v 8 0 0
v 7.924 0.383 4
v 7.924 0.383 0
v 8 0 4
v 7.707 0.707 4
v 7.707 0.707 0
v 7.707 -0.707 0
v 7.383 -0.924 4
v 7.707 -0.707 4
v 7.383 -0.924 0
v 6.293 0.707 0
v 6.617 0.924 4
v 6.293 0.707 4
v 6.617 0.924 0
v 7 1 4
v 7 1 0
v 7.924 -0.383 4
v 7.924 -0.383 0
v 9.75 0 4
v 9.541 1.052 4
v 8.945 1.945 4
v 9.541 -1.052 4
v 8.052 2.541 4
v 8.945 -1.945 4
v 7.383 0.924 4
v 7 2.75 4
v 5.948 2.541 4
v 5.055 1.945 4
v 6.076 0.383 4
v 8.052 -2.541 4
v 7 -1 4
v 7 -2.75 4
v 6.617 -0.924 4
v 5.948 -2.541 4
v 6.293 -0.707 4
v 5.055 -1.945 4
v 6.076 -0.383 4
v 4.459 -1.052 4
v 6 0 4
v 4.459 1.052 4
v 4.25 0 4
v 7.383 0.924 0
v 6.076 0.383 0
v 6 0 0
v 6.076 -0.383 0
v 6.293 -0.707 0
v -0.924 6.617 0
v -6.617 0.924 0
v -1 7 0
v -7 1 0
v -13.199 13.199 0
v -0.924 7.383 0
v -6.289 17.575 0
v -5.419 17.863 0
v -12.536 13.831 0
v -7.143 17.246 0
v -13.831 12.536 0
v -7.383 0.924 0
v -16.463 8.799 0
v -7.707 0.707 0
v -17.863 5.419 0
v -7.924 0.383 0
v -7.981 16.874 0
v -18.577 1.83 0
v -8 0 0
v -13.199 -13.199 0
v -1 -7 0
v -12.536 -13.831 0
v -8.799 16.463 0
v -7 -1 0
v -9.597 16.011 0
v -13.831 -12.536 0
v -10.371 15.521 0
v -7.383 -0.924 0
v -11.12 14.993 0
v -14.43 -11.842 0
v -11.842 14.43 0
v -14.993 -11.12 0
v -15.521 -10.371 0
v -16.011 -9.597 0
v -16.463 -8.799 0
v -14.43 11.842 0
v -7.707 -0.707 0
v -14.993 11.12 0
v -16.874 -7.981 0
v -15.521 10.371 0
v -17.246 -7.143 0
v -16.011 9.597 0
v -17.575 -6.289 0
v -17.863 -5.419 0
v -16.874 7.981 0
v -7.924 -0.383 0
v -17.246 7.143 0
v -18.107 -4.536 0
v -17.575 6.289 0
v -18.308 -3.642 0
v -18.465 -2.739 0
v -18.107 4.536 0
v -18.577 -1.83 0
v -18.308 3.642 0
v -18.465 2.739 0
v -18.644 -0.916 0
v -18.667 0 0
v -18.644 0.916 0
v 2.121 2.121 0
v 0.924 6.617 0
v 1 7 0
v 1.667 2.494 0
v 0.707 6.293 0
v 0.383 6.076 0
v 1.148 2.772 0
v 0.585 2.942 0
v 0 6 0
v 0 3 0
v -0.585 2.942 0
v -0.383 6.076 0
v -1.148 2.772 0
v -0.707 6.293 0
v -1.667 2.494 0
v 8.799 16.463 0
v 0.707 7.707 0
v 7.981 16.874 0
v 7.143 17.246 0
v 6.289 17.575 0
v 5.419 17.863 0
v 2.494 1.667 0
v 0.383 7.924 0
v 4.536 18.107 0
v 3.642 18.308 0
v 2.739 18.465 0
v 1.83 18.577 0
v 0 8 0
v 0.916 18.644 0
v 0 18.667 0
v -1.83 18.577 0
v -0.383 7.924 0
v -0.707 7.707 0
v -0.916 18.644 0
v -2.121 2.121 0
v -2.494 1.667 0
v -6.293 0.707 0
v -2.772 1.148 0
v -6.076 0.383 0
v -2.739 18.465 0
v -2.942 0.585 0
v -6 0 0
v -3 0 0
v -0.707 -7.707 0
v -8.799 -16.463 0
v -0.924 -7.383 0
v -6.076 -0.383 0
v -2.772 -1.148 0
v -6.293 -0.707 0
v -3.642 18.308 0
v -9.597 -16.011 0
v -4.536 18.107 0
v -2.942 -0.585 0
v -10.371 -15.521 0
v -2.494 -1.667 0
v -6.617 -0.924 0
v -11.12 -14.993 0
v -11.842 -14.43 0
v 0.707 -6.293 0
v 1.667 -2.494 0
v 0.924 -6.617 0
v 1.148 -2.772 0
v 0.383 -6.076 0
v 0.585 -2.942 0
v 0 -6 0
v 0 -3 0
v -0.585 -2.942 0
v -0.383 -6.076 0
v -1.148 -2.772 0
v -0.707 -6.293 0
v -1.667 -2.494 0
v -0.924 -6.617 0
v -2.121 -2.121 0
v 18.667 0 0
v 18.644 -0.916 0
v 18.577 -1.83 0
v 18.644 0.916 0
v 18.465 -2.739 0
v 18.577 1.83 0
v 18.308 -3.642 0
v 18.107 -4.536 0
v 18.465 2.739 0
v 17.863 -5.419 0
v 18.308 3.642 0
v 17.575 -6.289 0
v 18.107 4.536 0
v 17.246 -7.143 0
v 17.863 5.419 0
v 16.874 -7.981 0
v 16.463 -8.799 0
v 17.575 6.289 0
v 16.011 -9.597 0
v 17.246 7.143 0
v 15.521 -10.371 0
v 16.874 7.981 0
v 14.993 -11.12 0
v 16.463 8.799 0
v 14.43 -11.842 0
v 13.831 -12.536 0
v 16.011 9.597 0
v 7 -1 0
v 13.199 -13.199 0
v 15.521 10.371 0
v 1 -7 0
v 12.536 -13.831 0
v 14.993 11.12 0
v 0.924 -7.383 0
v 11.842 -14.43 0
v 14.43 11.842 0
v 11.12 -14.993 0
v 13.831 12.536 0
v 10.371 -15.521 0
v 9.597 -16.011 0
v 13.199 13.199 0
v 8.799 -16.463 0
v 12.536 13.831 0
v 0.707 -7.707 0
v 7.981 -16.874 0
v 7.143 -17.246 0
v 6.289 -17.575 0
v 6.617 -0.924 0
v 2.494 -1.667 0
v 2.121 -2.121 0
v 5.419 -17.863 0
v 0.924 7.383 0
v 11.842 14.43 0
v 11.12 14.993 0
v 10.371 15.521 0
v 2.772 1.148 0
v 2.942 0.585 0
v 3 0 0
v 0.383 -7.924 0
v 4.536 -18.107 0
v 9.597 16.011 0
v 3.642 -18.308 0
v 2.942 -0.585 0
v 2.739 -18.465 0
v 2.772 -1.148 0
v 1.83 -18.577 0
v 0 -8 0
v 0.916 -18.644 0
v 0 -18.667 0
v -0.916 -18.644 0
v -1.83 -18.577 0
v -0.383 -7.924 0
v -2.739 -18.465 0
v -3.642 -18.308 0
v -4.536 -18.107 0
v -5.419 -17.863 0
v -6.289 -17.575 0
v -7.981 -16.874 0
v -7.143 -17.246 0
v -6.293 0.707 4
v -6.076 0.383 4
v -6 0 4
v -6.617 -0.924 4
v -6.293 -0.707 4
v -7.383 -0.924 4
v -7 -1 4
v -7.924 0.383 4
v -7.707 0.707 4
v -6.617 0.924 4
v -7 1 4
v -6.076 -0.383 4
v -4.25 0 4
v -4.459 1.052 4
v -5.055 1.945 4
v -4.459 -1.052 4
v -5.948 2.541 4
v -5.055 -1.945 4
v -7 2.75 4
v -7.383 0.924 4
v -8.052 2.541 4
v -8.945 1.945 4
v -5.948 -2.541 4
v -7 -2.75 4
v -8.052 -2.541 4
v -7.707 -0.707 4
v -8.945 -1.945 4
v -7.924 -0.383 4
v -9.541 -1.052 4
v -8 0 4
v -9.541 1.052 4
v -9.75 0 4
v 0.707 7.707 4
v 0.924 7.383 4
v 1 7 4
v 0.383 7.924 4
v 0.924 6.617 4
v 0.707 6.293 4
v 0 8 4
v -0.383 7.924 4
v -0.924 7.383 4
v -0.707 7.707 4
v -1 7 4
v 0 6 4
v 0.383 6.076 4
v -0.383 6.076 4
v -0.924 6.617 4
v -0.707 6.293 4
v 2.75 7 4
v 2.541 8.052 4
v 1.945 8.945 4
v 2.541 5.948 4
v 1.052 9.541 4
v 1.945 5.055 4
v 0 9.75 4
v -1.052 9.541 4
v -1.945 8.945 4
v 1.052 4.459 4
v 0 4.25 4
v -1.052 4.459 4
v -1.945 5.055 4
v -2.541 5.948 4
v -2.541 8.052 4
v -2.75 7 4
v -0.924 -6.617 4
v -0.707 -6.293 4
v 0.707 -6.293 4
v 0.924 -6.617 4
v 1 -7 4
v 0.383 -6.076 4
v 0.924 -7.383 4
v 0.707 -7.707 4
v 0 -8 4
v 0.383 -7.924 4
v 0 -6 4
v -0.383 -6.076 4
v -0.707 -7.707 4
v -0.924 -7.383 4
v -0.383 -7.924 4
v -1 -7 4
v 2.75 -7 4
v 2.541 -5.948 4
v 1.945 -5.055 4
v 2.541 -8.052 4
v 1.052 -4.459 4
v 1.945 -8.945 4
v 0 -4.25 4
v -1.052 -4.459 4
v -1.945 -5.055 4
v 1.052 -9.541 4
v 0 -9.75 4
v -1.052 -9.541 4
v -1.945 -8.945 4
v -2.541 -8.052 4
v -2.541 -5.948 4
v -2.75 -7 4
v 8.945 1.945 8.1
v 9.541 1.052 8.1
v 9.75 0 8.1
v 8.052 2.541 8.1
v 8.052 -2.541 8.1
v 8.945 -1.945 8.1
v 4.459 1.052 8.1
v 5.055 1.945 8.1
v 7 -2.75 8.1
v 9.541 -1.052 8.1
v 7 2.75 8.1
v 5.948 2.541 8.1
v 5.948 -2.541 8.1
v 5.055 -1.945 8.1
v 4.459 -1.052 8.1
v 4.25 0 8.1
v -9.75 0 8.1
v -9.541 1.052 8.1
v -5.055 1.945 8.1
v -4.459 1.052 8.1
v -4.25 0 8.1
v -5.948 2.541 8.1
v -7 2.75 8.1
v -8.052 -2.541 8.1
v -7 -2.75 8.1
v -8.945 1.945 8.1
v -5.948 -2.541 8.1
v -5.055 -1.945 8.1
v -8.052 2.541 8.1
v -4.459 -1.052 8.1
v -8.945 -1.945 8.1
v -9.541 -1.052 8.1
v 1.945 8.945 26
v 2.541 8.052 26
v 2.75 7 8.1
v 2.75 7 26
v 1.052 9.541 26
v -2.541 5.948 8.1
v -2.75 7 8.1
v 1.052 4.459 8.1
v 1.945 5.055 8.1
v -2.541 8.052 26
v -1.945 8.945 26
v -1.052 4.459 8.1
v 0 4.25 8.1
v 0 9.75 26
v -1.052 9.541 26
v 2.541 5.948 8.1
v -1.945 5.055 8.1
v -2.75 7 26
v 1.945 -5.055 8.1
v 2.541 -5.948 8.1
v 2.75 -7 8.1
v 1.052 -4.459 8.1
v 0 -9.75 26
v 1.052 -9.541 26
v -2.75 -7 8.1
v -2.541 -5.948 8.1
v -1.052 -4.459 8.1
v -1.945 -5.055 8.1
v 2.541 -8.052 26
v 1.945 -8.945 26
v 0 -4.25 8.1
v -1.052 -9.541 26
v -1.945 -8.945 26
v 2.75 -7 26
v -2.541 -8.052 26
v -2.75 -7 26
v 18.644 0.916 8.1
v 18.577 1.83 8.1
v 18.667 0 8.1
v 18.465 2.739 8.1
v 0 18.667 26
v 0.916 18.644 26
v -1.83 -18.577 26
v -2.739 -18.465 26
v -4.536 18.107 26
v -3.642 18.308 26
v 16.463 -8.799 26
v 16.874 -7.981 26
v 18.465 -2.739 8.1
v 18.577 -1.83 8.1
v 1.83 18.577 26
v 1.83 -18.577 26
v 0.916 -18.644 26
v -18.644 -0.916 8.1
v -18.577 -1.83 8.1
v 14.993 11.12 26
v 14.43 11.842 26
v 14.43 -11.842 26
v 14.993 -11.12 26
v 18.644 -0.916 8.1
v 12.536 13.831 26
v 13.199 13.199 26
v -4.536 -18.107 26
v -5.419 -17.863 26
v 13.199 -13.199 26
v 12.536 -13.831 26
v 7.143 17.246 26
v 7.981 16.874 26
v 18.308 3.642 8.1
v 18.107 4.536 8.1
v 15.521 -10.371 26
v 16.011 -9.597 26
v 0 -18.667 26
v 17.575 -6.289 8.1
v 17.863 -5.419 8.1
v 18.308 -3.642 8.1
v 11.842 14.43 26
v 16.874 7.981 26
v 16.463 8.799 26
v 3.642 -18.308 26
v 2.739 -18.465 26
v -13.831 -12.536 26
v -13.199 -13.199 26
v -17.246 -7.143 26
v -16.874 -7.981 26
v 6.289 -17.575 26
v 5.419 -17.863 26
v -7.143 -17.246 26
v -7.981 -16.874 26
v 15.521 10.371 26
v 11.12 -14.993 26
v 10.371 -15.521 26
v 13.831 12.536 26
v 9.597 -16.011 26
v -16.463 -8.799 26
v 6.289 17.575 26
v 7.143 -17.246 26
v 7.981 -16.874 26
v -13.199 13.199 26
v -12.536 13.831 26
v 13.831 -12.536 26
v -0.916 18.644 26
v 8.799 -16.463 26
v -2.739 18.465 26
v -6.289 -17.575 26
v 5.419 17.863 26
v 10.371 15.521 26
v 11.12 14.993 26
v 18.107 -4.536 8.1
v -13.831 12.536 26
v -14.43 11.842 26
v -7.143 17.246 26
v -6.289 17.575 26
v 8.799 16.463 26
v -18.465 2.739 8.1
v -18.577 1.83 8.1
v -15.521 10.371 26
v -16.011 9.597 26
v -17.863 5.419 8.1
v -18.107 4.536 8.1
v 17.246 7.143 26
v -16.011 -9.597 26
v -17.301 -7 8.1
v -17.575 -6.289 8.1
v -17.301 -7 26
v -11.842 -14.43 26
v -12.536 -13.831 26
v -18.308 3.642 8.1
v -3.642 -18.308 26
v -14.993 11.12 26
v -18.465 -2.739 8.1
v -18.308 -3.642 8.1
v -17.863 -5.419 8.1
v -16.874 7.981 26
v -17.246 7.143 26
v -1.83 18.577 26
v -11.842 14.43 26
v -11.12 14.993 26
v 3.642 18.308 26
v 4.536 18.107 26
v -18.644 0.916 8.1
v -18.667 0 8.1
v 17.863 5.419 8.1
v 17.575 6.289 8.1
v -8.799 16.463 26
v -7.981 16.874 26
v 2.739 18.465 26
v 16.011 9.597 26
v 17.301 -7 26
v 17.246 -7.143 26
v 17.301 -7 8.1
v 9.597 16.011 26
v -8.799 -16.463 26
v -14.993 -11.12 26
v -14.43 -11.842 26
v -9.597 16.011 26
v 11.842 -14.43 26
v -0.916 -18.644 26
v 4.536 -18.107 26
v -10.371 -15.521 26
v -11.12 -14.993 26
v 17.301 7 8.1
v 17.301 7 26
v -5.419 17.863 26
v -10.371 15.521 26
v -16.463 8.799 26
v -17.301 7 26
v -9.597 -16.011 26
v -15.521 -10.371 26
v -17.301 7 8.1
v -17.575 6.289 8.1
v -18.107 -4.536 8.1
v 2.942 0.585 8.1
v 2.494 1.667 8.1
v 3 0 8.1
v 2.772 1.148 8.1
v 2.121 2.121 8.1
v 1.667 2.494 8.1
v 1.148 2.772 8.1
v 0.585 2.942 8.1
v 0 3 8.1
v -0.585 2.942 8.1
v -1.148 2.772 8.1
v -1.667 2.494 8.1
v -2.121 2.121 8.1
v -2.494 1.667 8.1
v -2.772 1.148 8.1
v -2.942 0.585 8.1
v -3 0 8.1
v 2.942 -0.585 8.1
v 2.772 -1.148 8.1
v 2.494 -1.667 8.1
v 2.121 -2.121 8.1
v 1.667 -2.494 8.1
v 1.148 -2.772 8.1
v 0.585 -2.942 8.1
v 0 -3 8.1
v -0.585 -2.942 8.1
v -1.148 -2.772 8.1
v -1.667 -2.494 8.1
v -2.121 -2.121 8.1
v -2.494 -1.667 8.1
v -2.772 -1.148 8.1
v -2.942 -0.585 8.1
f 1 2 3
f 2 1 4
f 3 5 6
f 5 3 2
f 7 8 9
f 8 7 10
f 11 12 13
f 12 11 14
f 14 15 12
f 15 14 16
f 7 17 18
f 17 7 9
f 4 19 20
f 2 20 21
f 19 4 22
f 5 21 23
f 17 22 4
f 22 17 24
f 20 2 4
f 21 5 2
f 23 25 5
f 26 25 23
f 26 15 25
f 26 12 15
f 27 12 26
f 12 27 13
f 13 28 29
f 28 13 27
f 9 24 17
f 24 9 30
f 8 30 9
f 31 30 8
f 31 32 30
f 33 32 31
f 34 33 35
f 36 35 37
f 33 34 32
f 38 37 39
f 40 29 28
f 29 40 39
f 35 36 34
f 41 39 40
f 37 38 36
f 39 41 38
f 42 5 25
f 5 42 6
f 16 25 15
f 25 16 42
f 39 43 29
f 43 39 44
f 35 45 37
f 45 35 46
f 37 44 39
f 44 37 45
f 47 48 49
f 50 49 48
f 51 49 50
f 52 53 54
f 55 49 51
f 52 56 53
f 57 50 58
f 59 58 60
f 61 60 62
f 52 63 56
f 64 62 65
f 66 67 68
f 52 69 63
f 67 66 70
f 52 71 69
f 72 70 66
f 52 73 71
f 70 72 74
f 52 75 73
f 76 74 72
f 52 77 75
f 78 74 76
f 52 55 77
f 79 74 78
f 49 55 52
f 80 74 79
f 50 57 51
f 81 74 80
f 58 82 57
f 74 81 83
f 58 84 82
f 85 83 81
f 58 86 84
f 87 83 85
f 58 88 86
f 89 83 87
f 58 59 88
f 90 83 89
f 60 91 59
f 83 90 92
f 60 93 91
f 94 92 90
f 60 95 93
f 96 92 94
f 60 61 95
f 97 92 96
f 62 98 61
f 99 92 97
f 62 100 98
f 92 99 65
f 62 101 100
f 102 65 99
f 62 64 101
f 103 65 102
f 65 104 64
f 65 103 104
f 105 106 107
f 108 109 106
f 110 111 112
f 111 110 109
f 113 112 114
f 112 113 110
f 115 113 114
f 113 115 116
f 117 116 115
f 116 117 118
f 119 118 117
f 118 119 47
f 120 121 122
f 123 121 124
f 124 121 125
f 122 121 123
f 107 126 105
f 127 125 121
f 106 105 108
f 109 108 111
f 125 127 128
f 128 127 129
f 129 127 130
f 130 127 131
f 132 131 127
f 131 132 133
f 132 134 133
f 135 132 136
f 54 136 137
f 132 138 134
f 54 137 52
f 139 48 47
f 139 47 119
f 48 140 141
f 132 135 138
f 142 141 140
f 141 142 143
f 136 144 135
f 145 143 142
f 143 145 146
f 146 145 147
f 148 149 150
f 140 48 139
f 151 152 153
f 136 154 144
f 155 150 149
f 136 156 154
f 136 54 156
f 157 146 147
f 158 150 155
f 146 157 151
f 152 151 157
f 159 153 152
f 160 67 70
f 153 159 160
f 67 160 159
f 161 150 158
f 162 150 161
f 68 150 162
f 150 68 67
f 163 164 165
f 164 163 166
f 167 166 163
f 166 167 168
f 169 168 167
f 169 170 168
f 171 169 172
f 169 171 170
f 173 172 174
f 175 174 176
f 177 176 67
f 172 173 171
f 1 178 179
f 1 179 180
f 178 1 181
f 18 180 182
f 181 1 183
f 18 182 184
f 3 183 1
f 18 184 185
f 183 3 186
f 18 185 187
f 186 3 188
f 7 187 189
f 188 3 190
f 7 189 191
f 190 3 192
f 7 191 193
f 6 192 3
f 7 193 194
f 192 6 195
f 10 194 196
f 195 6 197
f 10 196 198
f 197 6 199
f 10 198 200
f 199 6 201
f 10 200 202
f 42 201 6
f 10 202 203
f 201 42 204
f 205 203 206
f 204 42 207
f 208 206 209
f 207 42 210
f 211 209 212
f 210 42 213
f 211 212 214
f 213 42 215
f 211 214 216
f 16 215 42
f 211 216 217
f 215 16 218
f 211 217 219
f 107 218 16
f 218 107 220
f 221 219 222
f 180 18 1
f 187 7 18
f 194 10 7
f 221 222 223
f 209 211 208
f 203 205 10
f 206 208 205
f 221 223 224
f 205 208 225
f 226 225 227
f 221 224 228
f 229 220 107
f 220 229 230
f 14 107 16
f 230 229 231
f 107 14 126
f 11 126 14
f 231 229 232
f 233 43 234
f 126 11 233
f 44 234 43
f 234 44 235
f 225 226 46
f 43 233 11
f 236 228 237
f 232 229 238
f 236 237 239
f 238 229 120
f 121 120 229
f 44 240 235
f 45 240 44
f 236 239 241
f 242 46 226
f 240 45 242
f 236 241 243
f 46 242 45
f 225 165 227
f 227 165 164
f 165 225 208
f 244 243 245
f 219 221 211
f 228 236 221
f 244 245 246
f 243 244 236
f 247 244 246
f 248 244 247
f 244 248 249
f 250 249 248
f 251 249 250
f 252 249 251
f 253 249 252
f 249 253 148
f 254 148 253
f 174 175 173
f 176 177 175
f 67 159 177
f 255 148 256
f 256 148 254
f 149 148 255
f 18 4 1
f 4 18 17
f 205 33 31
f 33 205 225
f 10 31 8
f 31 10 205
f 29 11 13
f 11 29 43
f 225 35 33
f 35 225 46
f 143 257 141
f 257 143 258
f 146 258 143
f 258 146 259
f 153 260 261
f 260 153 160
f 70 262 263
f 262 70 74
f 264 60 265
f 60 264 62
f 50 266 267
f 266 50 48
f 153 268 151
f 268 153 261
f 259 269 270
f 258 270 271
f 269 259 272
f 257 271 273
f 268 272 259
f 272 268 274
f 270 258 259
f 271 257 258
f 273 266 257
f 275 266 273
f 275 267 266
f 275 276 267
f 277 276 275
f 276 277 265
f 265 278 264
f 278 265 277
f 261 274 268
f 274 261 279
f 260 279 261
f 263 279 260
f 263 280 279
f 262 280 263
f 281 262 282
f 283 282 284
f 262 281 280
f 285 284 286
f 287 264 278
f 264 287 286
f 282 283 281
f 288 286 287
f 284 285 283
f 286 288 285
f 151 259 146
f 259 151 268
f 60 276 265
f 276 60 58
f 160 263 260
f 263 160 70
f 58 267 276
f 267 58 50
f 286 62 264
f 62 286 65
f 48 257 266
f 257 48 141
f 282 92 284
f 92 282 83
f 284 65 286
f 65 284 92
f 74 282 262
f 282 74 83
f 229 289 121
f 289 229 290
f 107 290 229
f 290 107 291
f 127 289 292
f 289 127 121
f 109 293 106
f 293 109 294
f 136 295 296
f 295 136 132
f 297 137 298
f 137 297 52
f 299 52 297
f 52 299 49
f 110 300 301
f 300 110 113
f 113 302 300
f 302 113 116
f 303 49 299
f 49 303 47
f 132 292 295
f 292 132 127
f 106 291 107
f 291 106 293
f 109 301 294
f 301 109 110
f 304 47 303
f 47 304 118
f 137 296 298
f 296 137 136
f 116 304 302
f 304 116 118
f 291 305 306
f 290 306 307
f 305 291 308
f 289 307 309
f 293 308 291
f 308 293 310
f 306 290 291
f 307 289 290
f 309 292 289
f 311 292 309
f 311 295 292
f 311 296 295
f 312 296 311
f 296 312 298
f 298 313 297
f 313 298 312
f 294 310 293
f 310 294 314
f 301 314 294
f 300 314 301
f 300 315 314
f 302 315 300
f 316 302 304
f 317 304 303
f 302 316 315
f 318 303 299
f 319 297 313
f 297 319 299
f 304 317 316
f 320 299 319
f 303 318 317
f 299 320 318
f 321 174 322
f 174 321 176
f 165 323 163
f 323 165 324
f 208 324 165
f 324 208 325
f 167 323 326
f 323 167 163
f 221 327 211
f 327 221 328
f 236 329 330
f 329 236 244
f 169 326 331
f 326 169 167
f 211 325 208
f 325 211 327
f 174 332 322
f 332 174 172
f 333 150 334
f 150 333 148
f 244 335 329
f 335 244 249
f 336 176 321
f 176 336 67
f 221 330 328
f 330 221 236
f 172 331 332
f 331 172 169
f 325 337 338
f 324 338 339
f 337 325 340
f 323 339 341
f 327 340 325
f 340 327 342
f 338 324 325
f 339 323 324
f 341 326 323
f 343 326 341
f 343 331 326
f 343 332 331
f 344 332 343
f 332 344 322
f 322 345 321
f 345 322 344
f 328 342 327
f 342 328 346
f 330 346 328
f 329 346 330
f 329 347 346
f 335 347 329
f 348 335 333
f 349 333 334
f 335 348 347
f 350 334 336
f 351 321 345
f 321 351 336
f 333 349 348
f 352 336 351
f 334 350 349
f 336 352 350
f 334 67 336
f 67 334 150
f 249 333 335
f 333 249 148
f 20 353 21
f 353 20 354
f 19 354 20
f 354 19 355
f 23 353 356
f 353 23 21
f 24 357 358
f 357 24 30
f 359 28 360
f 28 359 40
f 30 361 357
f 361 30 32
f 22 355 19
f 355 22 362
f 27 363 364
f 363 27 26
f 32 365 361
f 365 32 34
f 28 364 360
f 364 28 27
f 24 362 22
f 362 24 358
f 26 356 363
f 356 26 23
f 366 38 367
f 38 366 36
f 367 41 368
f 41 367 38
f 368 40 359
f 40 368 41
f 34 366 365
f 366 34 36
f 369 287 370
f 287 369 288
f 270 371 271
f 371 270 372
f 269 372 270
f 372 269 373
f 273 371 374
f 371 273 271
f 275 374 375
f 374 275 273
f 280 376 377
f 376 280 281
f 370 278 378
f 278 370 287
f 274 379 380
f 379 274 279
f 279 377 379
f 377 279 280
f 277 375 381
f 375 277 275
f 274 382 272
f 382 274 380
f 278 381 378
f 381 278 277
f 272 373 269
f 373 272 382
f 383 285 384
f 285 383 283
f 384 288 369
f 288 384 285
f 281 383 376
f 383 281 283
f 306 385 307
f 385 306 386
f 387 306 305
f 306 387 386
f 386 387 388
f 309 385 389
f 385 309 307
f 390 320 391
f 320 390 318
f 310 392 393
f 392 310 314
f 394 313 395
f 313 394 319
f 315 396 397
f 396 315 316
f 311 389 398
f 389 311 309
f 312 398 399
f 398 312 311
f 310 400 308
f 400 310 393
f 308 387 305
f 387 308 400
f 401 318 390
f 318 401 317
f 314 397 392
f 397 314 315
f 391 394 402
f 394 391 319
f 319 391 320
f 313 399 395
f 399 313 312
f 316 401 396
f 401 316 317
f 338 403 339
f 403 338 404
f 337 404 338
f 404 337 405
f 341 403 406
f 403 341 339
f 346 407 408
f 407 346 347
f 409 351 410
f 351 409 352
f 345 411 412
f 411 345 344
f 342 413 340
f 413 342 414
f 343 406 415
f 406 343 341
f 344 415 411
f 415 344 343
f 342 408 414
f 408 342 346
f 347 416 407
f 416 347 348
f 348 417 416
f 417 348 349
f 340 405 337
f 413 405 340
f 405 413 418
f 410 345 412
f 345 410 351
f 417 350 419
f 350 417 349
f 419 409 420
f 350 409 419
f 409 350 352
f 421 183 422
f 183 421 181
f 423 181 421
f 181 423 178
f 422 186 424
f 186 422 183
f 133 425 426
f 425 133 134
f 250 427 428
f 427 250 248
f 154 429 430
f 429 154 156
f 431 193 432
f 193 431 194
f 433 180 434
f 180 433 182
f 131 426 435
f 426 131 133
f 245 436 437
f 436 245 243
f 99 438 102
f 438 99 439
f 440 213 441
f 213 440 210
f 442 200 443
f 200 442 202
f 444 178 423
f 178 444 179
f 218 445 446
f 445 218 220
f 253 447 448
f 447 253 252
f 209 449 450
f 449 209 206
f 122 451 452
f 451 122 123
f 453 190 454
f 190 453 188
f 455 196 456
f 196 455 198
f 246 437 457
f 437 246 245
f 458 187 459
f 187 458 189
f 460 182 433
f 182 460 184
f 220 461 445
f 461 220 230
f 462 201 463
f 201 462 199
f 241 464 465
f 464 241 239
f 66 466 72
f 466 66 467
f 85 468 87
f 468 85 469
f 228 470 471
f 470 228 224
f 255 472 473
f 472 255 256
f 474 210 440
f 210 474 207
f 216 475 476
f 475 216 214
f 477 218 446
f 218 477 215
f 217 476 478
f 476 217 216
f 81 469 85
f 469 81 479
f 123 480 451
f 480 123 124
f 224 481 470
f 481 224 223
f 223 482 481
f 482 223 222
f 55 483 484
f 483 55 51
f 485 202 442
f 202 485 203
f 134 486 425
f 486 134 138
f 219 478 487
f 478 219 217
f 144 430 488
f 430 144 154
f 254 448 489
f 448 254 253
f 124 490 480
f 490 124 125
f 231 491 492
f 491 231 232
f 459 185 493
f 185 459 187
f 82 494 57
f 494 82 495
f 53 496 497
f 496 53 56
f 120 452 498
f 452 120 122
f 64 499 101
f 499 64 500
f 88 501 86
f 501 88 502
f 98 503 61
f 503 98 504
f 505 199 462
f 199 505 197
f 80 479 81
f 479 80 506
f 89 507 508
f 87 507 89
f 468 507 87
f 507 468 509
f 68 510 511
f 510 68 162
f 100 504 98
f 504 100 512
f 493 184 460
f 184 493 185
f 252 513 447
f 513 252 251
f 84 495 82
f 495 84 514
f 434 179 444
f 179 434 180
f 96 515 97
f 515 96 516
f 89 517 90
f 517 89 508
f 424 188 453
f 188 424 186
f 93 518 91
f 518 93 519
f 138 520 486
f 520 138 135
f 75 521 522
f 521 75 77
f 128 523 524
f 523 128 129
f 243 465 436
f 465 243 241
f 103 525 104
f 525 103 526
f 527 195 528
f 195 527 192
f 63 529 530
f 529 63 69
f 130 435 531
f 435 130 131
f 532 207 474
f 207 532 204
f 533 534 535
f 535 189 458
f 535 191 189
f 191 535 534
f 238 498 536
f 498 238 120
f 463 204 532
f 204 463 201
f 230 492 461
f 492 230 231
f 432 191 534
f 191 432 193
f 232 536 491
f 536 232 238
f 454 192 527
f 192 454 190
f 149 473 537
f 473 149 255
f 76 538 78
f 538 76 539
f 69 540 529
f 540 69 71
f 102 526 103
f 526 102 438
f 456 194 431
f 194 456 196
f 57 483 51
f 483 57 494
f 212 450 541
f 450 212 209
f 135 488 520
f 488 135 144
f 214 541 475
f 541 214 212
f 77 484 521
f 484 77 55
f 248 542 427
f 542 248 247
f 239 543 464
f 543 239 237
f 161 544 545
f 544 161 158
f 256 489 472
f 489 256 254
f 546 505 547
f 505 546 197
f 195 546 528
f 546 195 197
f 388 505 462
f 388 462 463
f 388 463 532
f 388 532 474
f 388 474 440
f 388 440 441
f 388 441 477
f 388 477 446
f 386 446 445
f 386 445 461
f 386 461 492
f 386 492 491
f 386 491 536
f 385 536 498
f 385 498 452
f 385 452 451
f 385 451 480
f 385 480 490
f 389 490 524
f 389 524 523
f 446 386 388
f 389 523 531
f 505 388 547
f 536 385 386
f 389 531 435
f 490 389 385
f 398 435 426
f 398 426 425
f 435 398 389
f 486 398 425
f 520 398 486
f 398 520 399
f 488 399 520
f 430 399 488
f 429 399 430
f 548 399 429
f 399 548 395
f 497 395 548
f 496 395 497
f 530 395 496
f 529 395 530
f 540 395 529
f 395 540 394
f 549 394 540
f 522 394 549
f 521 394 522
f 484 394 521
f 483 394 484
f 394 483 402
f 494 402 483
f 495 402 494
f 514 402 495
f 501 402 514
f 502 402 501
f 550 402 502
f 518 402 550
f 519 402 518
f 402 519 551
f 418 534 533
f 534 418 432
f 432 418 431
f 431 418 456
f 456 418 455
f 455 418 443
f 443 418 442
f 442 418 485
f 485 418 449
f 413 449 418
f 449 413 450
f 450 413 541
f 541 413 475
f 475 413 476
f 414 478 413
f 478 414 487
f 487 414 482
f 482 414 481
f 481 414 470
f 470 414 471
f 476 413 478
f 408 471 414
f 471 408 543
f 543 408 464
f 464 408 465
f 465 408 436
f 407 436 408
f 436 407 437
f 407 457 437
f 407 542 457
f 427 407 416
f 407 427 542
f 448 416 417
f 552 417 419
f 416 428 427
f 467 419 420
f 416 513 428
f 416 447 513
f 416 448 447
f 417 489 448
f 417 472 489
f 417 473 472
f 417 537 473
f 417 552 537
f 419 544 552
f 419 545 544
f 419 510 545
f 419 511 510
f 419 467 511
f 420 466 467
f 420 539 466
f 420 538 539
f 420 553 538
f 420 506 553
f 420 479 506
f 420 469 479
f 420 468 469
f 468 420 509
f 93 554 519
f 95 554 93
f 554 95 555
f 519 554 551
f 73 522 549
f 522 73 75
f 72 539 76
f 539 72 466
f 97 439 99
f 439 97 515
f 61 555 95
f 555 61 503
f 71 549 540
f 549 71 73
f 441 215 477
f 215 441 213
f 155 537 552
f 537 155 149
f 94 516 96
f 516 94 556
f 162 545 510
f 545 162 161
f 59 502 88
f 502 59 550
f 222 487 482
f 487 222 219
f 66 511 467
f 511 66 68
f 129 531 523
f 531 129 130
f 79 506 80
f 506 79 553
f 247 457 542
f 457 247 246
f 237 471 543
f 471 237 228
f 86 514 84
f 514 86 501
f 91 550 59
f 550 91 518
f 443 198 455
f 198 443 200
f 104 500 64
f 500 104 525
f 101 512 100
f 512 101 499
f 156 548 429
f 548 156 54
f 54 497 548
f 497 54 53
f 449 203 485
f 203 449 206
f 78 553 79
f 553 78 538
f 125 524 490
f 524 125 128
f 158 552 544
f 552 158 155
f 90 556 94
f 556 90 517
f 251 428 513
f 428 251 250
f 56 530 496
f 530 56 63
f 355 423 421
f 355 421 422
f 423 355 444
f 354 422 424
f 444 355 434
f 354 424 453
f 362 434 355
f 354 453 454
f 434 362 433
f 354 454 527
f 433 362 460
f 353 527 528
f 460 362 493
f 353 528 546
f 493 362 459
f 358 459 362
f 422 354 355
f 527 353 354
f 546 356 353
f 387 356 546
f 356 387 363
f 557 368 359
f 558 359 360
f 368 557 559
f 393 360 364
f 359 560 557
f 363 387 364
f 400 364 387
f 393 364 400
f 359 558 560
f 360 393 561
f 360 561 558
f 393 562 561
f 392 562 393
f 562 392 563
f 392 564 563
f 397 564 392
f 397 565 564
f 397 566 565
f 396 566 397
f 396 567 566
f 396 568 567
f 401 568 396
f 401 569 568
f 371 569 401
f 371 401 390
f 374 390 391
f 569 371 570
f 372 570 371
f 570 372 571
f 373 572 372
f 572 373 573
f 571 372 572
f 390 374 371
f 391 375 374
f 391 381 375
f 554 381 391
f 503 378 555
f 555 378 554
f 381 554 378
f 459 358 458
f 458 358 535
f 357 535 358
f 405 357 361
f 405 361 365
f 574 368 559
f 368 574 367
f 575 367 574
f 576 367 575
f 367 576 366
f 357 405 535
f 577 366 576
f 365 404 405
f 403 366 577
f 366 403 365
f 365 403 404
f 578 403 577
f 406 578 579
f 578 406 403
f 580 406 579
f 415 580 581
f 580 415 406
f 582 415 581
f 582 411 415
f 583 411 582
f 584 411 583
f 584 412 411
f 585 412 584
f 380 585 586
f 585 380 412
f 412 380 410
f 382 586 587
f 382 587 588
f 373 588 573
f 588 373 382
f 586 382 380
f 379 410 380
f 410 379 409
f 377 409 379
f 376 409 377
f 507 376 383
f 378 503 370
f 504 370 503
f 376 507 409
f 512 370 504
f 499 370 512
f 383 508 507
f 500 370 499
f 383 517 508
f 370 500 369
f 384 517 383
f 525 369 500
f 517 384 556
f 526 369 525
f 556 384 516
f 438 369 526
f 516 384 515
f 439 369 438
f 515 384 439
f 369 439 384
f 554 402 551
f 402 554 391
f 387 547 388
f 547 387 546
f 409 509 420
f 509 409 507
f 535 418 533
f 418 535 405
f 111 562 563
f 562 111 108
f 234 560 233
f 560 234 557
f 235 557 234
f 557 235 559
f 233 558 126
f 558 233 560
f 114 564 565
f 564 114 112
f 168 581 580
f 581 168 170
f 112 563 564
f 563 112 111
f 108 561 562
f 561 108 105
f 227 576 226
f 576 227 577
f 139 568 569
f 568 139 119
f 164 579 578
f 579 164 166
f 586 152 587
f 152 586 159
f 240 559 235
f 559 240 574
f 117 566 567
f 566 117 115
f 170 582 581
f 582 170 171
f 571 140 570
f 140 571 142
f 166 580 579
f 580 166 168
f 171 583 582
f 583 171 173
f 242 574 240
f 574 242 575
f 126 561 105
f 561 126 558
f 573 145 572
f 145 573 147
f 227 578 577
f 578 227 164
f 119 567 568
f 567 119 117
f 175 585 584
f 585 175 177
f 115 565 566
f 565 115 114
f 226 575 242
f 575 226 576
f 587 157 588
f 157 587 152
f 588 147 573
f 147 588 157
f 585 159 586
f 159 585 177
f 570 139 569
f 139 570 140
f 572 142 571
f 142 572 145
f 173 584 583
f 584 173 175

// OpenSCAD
// 20 36 18 28

l1=20;
l2=36;
w=14;
h=26;


difference() {
    /*
    translate([(l2-l1)/2,0,0])
    union() {
        translate([0,0,h/2])
        minkowski() {
            cube([l1+l2+5,w+5,h],center=true);
            cylinder(d=5,h=0.001,$fn=16);
        }
    }*/
    
    cylinder(h=h,d=(l1+l2)*2/3,$fn=128);
    
    translate([(l2-l1)/2,0,0])
    translate([0,0,8.1])
    translate([0,0,(h-8)/2])
    cube([(l1+l2),w,h-8],center=true);
    
    wheelcutout(r=7);
    
    translate([0,0,4])
    wheelcutout(r=7, d=5.5, h=30);
    
    cylinder(d=6,h=50,$fn=32);
}

module wheelcutout(r=17/2,d=2,h=4) {
    translate([r,0,0])
    cylinder(d=d,h=h, $fn=16);
    
    translate([-r,0,0])
    cylinder(d=d,h=h, $fn=16);
    
    translate([0,r,0])
    cylinder(d=d,h=h, $fn=16);
    
    translate([0,-r,0])
    cylinder(d=d,h=h, $fn=16);
}
